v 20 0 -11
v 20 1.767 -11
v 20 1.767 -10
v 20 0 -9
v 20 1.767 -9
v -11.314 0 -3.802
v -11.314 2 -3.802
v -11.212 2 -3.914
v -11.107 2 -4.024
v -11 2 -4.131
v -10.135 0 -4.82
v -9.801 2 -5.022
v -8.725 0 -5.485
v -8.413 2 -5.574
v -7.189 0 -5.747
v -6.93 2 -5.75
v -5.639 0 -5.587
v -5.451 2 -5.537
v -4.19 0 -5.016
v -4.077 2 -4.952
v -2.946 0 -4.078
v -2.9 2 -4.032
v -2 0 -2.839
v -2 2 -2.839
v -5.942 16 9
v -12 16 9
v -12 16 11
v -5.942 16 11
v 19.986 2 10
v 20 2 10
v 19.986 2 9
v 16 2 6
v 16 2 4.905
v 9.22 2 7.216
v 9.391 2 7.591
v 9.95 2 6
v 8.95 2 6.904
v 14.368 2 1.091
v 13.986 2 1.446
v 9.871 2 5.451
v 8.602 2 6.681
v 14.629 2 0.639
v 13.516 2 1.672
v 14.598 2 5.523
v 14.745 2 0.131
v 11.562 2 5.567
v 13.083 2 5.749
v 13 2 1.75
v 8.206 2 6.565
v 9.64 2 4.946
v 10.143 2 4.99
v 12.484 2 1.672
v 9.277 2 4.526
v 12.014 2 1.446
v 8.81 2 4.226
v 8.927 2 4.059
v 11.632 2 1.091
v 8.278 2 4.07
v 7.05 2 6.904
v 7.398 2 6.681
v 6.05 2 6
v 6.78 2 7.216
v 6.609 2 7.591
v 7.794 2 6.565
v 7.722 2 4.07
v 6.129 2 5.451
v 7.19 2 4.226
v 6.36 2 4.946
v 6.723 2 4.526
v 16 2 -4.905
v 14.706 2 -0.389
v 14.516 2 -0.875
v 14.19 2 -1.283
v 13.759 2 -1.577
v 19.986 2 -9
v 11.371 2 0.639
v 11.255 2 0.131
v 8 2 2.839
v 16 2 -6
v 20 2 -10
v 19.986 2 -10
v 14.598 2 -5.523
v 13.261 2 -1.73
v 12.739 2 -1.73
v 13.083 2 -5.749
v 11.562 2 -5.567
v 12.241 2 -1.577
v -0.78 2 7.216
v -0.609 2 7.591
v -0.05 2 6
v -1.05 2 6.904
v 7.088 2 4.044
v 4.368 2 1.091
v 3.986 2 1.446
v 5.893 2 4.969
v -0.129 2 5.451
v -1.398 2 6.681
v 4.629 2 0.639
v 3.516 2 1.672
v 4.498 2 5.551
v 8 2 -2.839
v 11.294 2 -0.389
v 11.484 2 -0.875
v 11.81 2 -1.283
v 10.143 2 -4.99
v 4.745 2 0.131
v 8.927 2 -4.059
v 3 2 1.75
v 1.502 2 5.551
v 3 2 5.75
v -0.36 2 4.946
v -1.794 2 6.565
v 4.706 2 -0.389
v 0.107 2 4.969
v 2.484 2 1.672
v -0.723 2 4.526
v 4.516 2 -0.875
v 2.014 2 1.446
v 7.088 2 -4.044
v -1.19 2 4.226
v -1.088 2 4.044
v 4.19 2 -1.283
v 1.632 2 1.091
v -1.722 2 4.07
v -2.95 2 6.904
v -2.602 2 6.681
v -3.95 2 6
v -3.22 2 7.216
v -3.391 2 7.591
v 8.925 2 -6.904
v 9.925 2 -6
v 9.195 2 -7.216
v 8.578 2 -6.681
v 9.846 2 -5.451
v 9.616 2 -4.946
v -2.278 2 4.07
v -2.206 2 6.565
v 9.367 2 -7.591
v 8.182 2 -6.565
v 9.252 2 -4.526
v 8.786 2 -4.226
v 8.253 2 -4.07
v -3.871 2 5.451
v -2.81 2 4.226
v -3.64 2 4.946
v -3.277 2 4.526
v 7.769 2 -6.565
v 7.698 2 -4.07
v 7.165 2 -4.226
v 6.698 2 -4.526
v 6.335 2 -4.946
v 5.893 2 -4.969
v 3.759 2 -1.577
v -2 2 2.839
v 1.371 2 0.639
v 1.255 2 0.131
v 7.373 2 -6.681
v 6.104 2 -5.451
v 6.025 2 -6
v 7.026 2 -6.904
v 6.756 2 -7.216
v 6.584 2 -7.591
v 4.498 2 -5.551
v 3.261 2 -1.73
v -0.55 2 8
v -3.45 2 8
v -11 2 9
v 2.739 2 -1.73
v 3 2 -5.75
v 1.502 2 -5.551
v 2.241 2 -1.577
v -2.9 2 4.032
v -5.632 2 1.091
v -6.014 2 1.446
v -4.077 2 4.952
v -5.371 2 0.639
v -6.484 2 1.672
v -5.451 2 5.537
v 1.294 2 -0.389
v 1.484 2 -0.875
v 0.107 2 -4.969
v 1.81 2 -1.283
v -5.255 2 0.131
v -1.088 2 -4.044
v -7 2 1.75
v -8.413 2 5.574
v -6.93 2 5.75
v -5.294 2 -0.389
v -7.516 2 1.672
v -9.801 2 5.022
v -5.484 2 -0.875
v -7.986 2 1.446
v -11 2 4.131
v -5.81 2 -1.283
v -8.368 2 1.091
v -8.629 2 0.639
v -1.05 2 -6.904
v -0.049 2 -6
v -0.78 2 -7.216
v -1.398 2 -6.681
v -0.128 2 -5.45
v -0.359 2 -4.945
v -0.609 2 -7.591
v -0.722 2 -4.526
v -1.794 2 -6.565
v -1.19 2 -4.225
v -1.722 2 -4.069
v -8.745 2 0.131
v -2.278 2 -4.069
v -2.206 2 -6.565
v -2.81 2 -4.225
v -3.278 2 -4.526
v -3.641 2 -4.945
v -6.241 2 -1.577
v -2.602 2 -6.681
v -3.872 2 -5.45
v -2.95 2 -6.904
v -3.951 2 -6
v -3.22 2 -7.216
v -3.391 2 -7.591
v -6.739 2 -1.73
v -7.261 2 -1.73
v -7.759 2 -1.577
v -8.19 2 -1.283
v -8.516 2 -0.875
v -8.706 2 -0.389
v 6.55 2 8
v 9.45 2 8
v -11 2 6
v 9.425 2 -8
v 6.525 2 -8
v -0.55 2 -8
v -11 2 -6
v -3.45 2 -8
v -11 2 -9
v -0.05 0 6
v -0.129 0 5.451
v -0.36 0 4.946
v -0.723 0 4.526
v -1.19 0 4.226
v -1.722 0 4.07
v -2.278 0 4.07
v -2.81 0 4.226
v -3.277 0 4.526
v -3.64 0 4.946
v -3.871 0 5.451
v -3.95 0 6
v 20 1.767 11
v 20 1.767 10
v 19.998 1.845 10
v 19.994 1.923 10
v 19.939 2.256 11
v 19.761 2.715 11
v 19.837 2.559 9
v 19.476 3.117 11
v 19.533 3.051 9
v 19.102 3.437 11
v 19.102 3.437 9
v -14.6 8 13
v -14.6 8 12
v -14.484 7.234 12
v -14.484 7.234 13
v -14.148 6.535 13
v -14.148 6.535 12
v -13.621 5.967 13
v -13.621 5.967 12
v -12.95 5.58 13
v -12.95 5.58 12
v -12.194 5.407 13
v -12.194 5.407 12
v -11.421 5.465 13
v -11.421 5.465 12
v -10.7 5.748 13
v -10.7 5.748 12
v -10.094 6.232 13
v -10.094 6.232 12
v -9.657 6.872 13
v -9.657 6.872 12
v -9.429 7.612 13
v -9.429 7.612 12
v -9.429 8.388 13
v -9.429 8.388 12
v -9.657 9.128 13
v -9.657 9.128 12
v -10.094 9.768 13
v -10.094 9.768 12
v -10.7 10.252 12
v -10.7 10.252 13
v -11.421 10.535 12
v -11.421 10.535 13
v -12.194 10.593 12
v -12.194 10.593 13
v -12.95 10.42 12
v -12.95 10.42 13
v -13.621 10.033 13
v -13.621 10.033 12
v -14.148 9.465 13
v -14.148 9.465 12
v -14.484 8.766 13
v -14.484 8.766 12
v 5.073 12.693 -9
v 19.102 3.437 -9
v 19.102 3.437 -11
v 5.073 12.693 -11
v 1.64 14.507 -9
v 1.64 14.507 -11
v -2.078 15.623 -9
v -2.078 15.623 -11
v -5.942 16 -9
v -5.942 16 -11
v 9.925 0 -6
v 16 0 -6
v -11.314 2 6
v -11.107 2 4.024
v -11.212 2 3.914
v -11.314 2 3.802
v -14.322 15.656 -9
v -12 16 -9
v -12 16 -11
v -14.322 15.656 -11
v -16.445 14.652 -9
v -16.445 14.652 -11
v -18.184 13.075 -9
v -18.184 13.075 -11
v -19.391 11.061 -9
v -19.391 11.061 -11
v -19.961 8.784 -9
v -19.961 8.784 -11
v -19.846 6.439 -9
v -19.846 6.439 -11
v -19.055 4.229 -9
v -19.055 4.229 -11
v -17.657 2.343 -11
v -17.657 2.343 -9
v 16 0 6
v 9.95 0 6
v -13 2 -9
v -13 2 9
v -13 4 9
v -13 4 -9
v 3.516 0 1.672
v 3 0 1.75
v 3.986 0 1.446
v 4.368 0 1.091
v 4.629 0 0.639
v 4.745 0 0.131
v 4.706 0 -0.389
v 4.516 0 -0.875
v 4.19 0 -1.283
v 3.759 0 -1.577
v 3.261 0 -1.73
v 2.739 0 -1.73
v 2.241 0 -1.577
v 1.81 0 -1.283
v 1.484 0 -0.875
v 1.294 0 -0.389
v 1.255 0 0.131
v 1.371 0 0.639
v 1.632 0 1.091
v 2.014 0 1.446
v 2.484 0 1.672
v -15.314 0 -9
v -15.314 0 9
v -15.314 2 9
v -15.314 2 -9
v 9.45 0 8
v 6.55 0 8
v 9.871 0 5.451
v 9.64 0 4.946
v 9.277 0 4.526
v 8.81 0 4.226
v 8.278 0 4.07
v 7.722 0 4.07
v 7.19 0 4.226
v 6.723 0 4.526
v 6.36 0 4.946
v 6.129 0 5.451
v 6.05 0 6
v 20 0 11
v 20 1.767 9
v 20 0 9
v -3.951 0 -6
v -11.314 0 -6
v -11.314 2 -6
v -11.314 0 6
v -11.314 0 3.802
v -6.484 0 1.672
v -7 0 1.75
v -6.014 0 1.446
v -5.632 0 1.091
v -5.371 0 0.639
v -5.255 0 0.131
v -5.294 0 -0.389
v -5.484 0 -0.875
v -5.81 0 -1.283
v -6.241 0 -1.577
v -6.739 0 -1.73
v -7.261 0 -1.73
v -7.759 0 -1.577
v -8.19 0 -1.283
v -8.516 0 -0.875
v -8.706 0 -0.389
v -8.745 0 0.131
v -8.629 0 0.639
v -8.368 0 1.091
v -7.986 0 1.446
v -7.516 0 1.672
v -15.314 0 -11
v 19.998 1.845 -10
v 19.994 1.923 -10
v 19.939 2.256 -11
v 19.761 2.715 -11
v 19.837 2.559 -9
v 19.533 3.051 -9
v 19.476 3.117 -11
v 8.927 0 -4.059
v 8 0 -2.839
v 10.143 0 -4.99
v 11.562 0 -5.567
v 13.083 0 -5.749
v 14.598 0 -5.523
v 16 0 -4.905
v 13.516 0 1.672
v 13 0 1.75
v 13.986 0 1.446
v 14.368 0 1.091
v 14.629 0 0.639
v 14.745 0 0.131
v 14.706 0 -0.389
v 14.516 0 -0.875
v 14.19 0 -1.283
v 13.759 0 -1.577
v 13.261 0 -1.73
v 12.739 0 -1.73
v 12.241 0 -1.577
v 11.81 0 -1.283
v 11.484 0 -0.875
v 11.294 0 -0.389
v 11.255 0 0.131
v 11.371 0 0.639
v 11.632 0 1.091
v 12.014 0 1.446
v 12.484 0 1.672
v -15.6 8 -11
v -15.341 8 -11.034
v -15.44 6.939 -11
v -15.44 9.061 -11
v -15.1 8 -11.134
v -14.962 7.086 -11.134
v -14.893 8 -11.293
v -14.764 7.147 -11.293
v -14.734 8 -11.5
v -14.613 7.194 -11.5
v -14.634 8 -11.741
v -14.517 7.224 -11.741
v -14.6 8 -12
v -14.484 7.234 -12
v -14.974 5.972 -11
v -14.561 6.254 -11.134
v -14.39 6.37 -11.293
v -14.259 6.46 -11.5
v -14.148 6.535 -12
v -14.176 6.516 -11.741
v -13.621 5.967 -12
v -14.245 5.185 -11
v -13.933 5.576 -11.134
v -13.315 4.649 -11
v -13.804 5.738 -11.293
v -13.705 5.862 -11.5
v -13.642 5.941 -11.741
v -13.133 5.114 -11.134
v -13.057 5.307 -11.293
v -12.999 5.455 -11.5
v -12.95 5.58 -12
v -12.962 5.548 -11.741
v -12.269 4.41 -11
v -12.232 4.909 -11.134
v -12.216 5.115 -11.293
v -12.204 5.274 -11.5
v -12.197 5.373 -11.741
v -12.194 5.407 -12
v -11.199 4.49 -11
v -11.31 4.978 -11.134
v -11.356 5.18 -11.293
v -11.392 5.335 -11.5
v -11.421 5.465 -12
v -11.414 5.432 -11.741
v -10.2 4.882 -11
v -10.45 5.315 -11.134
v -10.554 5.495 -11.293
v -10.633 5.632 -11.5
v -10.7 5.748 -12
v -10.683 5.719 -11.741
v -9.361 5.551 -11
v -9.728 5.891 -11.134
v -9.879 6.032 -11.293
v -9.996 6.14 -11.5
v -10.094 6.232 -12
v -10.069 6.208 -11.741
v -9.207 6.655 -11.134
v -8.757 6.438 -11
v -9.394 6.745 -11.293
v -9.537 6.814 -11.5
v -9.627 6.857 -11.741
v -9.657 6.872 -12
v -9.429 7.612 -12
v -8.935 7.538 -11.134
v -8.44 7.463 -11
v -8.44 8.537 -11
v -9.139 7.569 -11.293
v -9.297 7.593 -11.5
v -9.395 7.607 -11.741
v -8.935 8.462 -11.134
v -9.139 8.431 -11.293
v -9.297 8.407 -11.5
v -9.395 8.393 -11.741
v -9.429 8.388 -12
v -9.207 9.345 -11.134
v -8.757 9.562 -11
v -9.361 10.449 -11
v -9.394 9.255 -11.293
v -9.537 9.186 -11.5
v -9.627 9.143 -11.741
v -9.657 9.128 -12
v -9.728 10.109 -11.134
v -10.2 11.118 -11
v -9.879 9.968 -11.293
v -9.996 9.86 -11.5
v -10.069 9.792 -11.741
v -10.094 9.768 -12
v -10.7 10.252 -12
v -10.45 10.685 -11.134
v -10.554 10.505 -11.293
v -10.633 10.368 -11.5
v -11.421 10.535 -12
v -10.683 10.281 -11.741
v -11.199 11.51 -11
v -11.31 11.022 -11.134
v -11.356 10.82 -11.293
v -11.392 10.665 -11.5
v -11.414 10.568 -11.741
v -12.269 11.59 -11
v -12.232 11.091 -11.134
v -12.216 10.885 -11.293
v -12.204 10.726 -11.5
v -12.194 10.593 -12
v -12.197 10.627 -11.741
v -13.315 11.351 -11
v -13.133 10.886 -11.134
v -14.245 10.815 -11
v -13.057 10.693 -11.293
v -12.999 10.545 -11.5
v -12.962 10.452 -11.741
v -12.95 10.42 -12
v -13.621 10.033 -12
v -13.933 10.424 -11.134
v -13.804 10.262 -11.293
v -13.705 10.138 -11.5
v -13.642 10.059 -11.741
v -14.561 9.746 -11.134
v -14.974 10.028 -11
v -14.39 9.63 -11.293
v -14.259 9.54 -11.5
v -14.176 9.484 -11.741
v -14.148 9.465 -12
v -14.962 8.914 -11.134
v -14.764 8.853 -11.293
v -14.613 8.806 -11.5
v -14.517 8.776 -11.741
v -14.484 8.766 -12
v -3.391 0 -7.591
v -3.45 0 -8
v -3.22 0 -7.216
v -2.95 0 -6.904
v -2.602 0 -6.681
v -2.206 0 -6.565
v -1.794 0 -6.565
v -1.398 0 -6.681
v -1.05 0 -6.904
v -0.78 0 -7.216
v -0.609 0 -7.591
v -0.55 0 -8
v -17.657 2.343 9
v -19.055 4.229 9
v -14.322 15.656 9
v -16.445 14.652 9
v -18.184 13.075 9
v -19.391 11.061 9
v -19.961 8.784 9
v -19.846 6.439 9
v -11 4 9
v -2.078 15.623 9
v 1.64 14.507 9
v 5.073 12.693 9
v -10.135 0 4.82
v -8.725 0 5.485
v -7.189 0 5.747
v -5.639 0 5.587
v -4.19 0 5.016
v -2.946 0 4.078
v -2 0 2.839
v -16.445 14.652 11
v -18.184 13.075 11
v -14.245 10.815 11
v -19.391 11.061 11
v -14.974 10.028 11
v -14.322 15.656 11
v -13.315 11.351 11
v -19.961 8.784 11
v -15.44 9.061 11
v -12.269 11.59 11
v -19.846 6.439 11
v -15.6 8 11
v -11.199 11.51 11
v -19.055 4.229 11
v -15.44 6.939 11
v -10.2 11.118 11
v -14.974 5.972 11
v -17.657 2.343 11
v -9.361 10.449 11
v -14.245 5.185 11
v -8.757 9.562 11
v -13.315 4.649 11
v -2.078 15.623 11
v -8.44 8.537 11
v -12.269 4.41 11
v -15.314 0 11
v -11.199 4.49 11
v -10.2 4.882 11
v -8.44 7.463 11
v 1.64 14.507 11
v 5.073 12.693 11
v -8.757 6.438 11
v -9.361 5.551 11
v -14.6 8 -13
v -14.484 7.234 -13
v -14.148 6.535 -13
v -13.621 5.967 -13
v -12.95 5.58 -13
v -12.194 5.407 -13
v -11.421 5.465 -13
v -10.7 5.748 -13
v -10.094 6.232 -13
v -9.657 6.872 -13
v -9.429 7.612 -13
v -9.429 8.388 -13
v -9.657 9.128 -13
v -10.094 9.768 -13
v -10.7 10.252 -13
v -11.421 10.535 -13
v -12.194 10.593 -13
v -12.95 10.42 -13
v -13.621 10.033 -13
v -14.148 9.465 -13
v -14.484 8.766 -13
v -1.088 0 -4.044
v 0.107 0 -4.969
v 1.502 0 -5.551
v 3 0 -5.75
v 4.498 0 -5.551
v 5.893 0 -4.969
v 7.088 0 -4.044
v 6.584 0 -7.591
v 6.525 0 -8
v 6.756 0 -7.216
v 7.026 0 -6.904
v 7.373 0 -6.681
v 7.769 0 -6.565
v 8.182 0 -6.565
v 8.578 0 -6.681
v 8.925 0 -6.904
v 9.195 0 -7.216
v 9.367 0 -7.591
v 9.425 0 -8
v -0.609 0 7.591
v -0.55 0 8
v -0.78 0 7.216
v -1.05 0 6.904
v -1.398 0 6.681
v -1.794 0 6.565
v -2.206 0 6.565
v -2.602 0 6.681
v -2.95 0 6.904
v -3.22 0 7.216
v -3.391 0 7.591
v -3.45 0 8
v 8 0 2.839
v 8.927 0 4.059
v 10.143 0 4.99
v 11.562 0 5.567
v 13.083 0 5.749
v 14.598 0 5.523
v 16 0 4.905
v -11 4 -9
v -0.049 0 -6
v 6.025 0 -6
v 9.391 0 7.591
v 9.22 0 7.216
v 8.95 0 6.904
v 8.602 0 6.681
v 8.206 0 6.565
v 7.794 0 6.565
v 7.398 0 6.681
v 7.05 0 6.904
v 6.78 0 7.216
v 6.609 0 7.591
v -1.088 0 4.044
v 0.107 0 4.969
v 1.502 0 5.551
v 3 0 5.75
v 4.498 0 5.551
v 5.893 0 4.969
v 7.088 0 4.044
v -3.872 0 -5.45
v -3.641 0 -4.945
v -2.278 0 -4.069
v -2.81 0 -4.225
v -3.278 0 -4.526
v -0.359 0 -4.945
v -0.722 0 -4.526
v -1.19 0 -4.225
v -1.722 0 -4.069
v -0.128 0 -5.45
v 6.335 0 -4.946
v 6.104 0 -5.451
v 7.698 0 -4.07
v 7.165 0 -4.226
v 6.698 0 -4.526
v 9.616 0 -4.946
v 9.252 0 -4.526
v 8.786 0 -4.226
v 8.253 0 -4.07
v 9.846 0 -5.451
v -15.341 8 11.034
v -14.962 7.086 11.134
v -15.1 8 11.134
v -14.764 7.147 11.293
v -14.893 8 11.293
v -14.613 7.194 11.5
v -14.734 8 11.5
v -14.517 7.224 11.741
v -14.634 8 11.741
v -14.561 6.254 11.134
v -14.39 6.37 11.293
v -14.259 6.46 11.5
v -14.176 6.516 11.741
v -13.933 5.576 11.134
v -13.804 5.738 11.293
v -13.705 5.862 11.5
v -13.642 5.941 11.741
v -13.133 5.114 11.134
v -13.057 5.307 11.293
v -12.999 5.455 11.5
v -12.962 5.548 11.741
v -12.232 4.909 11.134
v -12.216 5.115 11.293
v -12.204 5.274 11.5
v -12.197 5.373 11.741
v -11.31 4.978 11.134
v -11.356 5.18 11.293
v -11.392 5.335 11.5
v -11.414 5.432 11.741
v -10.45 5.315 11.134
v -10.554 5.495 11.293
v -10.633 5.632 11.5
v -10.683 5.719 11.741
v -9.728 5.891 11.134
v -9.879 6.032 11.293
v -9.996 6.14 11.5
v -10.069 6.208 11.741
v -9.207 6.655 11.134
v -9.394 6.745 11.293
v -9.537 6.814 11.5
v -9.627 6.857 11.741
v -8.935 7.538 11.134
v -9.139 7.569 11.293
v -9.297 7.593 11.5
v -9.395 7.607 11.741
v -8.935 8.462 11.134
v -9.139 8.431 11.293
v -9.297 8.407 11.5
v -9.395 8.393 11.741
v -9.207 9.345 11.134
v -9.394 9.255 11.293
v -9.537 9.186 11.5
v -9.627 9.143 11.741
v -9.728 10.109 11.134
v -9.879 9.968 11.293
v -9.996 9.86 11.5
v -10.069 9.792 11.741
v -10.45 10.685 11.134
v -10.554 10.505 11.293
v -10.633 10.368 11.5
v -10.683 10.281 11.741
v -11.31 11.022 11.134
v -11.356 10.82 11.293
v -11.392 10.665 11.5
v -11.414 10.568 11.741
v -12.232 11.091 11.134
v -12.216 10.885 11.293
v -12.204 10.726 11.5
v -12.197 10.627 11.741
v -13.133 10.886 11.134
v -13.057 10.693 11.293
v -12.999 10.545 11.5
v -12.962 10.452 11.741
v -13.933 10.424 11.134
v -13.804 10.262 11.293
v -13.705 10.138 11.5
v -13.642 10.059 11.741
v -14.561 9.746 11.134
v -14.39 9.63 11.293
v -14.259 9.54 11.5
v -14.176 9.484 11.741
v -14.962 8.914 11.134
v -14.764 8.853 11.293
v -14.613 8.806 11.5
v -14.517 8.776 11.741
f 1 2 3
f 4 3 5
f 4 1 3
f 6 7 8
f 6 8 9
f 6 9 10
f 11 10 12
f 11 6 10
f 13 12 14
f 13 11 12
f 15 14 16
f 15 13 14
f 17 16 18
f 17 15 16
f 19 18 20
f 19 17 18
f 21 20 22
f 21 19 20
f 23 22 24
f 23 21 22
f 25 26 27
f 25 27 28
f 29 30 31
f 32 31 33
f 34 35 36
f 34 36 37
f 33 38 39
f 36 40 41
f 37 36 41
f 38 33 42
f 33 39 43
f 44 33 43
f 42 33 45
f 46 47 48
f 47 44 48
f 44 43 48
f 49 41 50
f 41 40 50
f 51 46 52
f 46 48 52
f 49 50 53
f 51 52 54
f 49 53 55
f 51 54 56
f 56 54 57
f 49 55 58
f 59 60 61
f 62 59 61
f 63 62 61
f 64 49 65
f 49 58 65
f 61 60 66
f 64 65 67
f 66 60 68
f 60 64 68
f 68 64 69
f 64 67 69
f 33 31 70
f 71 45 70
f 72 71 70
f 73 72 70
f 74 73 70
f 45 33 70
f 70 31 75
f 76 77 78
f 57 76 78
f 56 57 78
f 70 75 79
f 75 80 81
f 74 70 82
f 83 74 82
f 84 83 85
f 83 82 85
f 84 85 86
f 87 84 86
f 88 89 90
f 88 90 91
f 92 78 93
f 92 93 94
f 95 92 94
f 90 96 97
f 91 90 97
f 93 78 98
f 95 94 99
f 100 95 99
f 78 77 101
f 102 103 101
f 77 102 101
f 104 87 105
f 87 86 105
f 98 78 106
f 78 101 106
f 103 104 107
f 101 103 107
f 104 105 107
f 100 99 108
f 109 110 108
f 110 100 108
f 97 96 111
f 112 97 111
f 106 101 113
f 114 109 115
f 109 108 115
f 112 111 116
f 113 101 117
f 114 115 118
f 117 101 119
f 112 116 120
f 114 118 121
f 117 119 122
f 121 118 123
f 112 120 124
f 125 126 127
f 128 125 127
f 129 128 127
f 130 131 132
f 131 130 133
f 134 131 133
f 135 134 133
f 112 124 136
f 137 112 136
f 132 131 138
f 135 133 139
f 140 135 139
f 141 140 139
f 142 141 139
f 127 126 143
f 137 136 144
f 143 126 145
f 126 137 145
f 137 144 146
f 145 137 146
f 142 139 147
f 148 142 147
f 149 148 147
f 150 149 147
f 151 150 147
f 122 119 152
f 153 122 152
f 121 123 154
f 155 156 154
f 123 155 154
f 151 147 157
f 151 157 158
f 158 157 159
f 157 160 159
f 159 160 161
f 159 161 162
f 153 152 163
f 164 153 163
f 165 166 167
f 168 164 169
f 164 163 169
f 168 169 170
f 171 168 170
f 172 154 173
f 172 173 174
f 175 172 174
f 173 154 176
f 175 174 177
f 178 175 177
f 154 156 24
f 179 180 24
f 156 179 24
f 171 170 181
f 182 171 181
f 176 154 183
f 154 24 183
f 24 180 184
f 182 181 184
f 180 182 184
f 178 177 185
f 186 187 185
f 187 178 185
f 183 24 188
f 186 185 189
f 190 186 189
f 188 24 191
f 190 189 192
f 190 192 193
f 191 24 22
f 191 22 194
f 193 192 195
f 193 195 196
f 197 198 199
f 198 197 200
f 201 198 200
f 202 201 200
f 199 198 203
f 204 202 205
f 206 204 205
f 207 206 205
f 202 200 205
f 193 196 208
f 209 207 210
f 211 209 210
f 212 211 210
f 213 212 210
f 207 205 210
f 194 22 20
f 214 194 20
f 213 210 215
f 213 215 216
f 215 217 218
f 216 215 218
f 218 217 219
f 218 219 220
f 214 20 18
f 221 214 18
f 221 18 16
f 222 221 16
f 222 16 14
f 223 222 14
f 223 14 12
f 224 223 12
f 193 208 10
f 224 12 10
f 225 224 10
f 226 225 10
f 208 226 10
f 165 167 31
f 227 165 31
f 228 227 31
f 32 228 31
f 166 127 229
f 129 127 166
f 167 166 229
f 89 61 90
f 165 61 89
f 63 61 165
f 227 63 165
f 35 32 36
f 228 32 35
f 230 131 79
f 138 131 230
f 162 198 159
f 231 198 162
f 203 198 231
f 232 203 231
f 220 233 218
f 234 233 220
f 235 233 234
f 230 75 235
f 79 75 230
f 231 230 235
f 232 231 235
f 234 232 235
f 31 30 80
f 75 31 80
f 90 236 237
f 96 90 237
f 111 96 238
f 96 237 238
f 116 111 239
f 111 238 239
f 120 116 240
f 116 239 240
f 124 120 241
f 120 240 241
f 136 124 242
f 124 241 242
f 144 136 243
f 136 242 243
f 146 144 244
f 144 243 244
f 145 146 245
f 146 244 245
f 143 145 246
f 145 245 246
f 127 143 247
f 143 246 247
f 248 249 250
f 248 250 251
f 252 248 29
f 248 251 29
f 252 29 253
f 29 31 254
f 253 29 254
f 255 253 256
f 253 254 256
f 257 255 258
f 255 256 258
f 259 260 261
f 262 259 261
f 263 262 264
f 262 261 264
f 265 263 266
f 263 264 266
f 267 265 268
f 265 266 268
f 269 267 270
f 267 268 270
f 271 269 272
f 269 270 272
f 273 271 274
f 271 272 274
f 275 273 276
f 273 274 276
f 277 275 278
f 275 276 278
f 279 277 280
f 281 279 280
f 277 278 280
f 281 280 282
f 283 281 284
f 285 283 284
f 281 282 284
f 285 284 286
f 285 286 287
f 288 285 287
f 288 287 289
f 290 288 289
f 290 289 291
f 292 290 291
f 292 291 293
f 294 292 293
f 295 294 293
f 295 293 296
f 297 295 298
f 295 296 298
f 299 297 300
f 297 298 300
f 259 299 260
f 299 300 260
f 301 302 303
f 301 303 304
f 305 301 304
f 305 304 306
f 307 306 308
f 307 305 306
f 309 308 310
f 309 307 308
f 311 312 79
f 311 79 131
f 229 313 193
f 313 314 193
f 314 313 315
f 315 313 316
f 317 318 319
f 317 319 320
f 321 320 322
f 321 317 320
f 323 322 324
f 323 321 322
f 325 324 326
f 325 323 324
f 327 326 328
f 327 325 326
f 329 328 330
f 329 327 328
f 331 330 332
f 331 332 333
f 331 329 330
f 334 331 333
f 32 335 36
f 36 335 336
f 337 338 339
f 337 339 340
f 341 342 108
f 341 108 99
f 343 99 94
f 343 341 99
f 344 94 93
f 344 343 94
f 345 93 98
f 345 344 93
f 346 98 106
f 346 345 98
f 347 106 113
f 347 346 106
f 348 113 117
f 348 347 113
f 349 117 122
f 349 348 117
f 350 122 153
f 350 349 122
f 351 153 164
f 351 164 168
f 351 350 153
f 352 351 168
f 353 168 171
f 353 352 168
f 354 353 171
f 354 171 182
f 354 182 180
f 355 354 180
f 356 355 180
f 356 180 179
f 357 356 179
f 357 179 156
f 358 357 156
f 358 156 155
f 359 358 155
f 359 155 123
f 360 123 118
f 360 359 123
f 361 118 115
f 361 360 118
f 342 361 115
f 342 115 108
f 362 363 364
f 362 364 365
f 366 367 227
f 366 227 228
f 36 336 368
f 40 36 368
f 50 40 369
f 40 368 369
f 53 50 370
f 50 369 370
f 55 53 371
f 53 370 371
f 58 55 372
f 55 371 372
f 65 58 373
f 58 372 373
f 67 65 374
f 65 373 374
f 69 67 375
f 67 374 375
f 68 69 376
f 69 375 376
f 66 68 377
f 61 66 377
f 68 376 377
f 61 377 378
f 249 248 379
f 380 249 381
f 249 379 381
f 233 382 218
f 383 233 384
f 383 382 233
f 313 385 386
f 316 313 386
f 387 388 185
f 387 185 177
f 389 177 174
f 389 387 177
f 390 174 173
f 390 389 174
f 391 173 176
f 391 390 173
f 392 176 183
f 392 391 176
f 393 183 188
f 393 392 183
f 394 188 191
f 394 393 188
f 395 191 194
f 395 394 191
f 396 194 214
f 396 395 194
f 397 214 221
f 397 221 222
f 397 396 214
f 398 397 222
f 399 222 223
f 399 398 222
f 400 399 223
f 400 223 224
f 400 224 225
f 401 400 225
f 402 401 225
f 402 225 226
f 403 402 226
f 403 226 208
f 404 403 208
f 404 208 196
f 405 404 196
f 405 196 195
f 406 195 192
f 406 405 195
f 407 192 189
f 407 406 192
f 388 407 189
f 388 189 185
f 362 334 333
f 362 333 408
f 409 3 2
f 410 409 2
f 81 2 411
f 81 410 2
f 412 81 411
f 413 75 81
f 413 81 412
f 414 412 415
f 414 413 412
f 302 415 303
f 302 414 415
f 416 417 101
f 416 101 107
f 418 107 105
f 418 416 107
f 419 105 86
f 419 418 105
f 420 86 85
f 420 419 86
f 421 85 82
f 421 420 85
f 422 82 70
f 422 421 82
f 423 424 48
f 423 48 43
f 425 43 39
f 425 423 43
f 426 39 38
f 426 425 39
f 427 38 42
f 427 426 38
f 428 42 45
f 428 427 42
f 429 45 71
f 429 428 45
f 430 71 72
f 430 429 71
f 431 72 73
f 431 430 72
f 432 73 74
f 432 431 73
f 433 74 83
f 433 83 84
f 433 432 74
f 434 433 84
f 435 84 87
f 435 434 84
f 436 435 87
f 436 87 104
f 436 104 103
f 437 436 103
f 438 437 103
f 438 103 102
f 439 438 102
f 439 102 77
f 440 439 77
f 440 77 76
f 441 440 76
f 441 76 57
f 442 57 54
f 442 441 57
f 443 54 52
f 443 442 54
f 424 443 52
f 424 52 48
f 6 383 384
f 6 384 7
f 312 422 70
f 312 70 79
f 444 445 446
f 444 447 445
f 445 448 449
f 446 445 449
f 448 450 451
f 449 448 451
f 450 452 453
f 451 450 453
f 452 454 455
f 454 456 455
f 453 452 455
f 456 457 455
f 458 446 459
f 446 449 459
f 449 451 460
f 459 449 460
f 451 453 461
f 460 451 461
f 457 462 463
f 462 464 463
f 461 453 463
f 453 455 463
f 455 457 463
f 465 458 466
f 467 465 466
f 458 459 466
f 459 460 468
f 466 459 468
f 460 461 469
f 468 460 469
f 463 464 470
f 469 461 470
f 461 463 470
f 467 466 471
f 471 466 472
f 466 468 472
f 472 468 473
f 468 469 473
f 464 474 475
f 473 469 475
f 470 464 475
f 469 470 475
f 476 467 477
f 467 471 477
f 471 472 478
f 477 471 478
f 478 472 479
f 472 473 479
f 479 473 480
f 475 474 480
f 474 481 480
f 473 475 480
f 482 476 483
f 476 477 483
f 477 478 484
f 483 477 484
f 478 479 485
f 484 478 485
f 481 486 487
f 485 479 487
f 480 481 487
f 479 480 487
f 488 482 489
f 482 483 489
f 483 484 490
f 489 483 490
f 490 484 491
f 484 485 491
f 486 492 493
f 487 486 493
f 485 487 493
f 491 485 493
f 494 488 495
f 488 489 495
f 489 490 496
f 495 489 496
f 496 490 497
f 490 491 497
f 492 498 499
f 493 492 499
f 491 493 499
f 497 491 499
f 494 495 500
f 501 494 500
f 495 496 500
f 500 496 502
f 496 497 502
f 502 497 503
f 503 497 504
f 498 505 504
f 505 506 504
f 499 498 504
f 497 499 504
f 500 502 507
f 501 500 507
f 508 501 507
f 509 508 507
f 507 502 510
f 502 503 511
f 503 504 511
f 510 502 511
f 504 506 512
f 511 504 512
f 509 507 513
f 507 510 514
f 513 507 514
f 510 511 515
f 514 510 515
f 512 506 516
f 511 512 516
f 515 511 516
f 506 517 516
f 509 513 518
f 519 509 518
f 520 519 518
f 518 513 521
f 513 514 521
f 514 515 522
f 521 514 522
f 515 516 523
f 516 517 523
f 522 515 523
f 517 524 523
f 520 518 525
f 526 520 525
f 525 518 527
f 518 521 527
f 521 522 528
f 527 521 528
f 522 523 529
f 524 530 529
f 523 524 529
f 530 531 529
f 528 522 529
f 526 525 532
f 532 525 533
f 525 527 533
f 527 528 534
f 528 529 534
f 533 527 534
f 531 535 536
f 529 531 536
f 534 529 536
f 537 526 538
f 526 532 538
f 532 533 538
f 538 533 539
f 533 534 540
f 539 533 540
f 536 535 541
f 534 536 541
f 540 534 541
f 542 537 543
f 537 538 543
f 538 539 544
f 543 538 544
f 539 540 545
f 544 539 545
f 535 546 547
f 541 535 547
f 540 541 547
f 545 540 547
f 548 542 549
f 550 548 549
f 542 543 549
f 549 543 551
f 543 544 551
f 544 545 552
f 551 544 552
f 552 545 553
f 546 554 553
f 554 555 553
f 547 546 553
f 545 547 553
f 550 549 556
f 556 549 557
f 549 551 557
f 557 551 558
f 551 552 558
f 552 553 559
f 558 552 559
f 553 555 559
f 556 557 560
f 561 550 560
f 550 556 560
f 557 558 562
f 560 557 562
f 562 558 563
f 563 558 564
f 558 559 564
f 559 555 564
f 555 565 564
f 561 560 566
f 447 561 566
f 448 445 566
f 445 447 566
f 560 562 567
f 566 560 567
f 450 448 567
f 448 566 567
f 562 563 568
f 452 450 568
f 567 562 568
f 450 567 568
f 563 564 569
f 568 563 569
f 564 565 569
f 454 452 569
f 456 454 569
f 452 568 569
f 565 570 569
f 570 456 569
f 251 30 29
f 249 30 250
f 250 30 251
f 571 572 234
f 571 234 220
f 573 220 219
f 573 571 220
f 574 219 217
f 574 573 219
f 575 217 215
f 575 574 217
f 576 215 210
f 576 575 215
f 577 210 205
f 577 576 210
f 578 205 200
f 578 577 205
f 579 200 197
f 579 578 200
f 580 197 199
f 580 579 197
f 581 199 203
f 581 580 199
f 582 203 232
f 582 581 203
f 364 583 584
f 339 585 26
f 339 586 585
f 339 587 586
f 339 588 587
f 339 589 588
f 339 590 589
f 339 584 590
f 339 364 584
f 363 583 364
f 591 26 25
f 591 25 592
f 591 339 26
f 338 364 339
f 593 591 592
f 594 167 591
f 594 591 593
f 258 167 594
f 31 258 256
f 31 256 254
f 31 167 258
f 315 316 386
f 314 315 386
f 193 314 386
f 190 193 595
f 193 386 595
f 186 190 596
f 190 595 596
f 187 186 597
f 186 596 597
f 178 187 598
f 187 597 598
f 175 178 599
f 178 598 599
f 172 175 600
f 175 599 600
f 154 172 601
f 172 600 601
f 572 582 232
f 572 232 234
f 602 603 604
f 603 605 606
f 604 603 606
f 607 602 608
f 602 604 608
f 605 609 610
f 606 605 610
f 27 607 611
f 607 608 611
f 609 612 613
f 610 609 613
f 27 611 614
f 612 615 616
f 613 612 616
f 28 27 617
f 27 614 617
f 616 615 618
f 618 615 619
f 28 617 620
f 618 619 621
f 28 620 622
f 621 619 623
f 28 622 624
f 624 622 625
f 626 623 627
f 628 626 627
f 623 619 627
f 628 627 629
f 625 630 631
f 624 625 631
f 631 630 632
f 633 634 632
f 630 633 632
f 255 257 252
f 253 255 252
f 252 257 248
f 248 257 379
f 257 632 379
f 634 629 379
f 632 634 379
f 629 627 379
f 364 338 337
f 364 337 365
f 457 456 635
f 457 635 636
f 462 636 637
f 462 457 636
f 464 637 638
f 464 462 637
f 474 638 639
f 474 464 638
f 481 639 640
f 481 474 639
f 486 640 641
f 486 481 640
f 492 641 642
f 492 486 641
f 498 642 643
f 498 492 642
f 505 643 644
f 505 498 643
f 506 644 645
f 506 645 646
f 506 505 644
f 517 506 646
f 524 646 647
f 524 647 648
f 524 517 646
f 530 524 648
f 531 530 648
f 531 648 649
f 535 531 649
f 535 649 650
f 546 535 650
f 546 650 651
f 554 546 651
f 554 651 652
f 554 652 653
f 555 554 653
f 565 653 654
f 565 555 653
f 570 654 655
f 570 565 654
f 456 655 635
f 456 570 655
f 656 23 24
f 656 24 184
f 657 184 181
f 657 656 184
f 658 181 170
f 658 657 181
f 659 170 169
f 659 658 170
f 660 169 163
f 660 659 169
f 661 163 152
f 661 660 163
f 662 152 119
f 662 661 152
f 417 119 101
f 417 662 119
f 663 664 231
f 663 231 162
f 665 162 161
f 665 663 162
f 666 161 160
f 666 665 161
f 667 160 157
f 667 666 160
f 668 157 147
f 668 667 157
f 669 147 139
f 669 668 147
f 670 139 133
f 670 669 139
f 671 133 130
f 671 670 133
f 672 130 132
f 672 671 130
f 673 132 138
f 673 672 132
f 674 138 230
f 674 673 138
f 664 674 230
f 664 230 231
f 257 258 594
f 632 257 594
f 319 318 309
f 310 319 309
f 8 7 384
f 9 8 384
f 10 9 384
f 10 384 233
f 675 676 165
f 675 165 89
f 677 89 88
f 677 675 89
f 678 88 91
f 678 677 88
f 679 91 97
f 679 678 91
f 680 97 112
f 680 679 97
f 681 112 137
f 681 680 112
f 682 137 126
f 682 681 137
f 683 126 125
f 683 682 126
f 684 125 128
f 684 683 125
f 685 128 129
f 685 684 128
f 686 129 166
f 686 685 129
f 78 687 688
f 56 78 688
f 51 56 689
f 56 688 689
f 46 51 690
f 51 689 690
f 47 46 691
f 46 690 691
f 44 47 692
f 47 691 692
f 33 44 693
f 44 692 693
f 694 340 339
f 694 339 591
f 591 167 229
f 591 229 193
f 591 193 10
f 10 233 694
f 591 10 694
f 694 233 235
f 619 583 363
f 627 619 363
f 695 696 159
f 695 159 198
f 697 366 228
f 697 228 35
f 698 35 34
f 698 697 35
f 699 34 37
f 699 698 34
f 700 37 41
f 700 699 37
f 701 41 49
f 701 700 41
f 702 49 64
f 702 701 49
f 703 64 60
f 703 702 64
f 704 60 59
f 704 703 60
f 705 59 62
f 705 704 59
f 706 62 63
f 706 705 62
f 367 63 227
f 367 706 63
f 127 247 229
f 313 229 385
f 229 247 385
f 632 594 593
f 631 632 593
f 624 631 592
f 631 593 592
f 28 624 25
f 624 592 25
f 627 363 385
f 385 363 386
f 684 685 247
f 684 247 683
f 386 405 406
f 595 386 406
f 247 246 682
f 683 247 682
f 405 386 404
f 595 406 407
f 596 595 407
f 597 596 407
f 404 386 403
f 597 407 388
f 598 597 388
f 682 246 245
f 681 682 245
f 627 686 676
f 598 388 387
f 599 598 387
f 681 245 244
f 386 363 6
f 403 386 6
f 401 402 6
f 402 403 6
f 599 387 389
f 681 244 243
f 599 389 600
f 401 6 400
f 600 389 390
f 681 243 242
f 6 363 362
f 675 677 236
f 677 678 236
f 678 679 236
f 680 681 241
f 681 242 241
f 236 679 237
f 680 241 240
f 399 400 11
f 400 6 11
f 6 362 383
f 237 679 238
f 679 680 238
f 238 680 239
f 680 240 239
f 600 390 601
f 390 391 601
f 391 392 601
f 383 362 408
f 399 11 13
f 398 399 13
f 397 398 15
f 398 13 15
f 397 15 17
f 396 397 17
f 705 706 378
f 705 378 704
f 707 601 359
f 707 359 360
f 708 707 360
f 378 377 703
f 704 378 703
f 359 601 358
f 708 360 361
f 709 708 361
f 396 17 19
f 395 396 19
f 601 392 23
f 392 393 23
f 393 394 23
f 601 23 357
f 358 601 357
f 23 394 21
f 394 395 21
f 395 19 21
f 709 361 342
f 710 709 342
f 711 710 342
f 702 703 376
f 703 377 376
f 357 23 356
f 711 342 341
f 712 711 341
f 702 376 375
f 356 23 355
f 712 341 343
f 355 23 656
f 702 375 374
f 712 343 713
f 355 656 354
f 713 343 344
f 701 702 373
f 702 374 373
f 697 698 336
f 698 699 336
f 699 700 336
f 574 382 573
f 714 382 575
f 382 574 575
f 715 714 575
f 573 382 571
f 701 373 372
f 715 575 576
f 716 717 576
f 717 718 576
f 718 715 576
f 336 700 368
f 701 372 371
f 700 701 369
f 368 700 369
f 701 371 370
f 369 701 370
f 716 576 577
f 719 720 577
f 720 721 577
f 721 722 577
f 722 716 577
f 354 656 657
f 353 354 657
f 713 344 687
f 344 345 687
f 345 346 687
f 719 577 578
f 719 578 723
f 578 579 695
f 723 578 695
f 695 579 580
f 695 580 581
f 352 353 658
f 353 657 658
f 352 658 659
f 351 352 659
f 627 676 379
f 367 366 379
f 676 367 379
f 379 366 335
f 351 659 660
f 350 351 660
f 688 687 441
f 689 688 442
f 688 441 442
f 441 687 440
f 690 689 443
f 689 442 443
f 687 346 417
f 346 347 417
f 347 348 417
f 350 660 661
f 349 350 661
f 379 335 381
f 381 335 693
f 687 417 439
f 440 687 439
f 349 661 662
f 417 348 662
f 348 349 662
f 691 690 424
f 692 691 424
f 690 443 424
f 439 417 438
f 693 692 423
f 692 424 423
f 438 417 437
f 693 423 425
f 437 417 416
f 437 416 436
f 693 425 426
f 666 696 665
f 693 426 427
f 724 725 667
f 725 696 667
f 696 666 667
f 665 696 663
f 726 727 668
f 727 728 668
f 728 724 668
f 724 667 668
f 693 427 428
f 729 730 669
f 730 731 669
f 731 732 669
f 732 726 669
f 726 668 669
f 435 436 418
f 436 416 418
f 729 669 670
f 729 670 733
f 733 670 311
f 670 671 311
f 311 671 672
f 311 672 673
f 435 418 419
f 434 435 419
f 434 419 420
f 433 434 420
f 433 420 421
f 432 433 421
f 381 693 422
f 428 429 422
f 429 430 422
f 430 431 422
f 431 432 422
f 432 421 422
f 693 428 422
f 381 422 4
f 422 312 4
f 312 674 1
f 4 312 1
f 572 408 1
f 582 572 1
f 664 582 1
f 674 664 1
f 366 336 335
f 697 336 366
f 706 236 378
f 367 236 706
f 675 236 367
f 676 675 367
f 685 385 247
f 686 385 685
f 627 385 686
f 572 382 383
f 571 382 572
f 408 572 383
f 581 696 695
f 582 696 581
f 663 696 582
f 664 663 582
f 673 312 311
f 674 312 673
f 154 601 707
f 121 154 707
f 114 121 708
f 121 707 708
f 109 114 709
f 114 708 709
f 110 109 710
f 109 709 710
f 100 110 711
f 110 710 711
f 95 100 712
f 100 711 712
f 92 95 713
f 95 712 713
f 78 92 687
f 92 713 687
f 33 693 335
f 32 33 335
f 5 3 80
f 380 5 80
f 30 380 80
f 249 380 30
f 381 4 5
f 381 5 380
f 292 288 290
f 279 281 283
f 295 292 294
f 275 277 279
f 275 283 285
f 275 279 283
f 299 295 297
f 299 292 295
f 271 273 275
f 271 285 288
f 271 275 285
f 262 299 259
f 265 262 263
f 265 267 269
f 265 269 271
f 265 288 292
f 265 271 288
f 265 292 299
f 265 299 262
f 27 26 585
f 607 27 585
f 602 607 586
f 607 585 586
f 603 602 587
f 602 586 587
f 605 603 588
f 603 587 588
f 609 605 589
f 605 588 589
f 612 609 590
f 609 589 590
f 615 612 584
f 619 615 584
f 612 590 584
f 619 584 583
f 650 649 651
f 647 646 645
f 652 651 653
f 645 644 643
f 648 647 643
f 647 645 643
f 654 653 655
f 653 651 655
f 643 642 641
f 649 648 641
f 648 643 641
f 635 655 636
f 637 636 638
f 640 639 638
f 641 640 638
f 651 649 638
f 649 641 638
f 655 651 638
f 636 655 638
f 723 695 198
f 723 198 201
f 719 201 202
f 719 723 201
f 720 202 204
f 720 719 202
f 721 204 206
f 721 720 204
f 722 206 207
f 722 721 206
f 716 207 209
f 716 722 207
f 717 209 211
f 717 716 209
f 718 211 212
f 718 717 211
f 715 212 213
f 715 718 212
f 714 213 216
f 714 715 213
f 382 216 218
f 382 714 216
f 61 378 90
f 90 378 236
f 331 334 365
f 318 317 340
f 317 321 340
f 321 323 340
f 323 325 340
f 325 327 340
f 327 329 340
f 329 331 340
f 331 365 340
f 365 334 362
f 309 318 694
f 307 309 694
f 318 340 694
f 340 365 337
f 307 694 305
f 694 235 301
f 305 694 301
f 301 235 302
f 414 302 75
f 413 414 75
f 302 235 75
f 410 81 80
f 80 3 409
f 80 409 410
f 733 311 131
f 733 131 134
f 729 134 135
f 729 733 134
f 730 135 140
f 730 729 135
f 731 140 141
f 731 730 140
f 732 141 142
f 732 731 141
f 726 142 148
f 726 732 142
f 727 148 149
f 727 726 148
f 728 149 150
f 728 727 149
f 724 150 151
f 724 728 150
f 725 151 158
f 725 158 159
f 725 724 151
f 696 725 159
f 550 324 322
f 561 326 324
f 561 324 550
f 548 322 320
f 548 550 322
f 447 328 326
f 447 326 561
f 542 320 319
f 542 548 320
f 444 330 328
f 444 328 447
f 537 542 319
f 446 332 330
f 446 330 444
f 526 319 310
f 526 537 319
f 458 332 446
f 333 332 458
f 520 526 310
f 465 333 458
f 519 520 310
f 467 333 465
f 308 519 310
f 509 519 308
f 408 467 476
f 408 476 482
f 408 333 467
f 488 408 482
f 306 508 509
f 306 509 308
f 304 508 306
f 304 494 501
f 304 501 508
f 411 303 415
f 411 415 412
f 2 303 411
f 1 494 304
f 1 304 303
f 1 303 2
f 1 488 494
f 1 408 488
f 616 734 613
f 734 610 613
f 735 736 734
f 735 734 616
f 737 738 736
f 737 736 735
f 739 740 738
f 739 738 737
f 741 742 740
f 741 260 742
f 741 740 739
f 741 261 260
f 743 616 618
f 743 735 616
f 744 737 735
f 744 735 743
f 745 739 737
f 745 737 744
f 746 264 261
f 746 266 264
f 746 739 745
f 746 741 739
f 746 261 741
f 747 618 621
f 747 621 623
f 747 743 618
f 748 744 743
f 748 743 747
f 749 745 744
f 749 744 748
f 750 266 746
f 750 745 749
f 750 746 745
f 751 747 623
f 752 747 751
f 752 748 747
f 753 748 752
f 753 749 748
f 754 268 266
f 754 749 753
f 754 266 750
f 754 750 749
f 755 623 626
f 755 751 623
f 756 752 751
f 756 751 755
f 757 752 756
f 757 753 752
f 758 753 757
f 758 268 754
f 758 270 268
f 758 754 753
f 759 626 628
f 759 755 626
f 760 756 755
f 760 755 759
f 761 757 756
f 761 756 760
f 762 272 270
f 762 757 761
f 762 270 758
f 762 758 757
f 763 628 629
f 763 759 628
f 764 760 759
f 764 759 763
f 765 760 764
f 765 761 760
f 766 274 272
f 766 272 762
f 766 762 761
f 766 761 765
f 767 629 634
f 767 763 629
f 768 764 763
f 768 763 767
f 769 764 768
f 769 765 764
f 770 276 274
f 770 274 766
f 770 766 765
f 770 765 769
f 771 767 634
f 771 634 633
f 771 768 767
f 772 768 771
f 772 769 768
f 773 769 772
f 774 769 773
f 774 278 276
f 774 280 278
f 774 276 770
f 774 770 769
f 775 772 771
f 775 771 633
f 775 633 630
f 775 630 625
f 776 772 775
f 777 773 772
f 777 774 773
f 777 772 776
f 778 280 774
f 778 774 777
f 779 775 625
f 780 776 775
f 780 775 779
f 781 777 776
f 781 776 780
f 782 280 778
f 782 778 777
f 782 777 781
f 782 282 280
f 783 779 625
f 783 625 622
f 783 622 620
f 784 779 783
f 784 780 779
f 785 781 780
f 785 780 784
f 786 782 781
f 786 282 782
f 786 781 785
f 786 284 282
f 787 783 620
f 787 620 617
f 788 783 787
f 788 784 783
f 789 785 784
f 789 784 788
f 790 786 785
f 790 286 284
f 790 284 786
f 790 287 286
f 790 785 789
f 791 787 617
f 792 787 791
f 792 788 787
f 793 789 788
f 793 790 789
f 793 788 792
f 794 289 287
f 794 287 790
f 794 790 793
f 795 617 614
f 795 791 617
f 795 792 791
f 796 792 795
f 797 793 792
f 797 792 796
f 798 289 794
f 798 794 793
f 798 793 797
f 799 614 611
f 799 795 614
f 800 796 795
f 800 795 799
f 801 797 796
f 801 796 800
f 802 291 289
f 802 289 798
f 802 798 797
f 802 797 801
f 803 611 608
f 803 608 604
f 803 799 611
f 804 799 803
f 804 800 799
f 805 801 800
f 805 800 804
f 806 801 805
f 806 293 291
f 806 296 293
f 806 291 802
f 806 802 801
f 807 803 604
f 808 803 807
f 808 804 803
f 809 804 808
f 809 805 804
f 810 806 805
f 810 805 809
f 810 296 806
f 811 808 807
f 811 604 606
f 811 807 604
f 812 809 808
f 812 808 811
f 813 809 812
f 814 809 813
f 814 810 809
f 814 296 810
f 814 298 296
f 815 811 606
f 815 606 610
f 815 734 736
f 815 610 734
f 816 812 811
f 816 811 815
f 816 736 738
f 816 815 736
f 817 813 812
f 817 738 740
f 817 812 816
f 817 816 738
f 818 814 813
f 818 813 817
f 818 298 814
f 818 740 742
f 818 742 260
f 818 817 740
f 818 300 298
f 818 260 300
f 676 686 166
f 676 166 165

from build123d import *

# Parameters (mm, degrees)
SKETCH6_W               = 40
SKETCH6_H               = 2
BOSS_EXTRUDE4_DEPTH     = 16
SKETCH8_R               = 2.6
BOSS_EXTRUDE5_DEPTH     = 2
FILLET1_R               = 1
CUT_EXTRUDE1_DEPTH      = 26.690465157
CUT_EXTRUDE1_DEPTH_BACK = 16
SKETCH7_W               = 42.708590122
SKETCH7_H               = 18.182038554
SKETCH14_R              = 1.749999912
SKETCH14_R_2            = 1.749999996
SKETCH14_R_3            = 1.749999993
BOSS_EXTRUDE8_DEPTH     = 2
SKETCH15_W              = 2
SKETCH15_H              = 18
EXTRUDE_THIN1_DEPTH     = 2


with BuildPart() as part:
    # Sketch6 → Boss-Extrude4 (new body)
    with BuildSketch(Plane(origin=(0, 0, 0), x_dir=(1, 0, 0), z_dir=(0, 1, 0))):
        with Locations((0, -10)):
            Rectangle(SKETCH6_W, SKETCH6_H)
    extrude(amount=BOSS_EXTRUDE4_DEPTH)

    # Sketch8 → Boss-Extrude5 (add)
    with BuildSketch(Plane.XY.offset(11)):
        with Locations(Location((-12, 8, 0), (0, 0, 180))):
            Circle(SKETCH8_R)
    extrude(amount=BOSS_EXTRUDE5_DEPTH)

    # Fillet1
    fillet1_edges = [part.edges().sort_by_distance(p)[0] for p in [
        (-9.4, 8, 11),
    ]]
    fillet(fillet1_edges, radius=FILLET1_R)

    # Sketch7 → Cut-Extrude1 (cut, two sides: drawn at the far end of the back side and taken through both)
    with BuildSketch(Plane.XY.offset(11).offset(-CUT_EXTRUDE1_DEPTH_BACK)):
        with Locations((0, 8)):
            Rectangle(SKETCH7_W, SKETCH7_H)
        with BuildLine():
            Line((-5.942038411, 16), (-12, 16))
            ThreePointArc((-12, 16), (-19.39103626, 11.061467459), (-17.656854249, 2.343145751))
            Line((-17.656854249, 2.343145751), (-15.313708499, 0))
            Line((-15.313708499, 0), (20, 0))
            Line((20, 0), (20, 1.767244224))
            ThreePointArc((20, 1.767244224), (19.761112544, 2.715127447), (19.101517394, 3.43657326))
            Line((19.101517394, 3.43657326), (5.07313553, 12.69329036))
            ThreePointArc((5.07313553, 12.69329036), (-0.191638738, 15.155492779), (-5.942038411, 16))
        make_face(mode=Mode.SUBTRACT)
    extrude(amount=CUT_EXTRUDE1_DEPTH + CUT_EXTRUDE1_DEPTH_BACK, mode=Mode.SUBTRACT)


with BuildPart() as body_2:
    # Mirror2: mirrored copy
    add(part.part.mirror(Plane.XY))


with BuildPart() as part_1:
    add(part.part)

    add(body_2.part)  # Boss-Extrude8 merges body 2
    # Sketch14 → Boss-Extrude8 (add)
    with BuildSketch(Plane(origin=(0, 0, 0), x_dir=(1, 0, 0), z_dir=(0, 1, 0))):
        Polygon((-15.313708496, -10), (-15.313708496, 10), (20.000000038, 10), (19.999999862, -10), align=None)
        with Locations(Location((12.999999996, -3e-07, 0), (0, 0, 270))):
            Circle(SKETCH14_R, mode=Mode.SUBTRACT)
        with Locations(Location((3, -1.24e-07, 0), (0, 0, 270))):
            Circle(SKETCH14_R_2, mode=Mode.SUBTRACT)
        with Locations(Location((-6.999999997, -1.24e-07, 0), (0, 0, 270))):
            Circle(SKETCH14_R_3, mode=Mode.SUBTRACT)
        with BuildLine():
            Line((16.000000003, 6), (9.925463662, 6))
            ThreePointArc((9.925463662, 6), (7.975463662, 4.05), (6.025463662, 6))
            Line((6.025463662, 6), (-0.049072678, 6))
            ThreePointArc((-0.049072678, 6), (-1.999999996, 4.049072682), (-3.950927314, 6))
            Line((-3.950927314, 6), (-11.313708496, 6))
            Line((-11.313708496, 6), (-11.313708496, 3.801896638))
            ThreePointArc((-11.313708496, 3.801896638), (-6.408964515, 5.719543307), (-1.999999996, 2.839454047))
            ThreePointArc((-1.999999996, 2.839454047), (3.000000101, 5.749999872), (8.000000096, 2.83945387))
            ThreePointArc((8.000000096, 2.83945387), (11.562298515, 5.567361143), (15.999999994, 4.905353815))
            Line((15.999999994, 4.905353815), (16.000000003, 6))
        make_face(mode=Mode.SUBTRACT)
        with BuildLine():
            Line((-11.313708496, -6), (-11.313708496, -3.801896885))
            ThreePointArc((-11.313708496, -3.801896885), (-6.408964515, -5.719543555), (-1.999999996, -2.839454295))
            ThreePointArc((-1.999999996, -2.839454295), (3, -5.75000012), (7.999999996, -2.839454295))
            ThreePointArc((7.999999996, -2.839454295), (11.562298368, -5.567361705), (15.999999907, -4.905354469))
            Line((15.999999907, -4.905354469), (15.999999897, -6))
            Line((15.999999897, -6), (9.949999996, -6))
            ThreePointArc((9.949999996, -6), (7.999999996, -4.05), (6.049999996, -6))
            Line((6.049999996, -6), (-0.049999996, -6))
            ThreePointArc((-0.049999996, -6), (-1.999999996, -4.05), (-3.949999996, -6))
            Line((-3.949999996, -6), (-11.313708496, -6))
        make_face(mode=Mode.SUBTRACT)
        with BuildLine():
            Line((9.425463662, 8), (6.525463662, 8))
            ThreePointArc((6.525463662, 8), (7.975463662, 6.55), (9.425463662, 8))
        make_face(mode=Mode.SUBTRACT)
        with BuildLine():
            Line((-3.449999996, -8), (-0.549999996, -8))
            ThreePointArc((-0.549999996, -8), (-1.999999996, -6.55), (-3.449999996, -8))
        make_face(mode=Mode.SUBTRACT)
        with BuildLine():
            Line((-0.549999996, 8), (-3.449999996, 8))
            ThreePointArc((-3.449999996, 8), (-1.999999996, 6.55), (-0.549999996, 8))
        make_face(mode=Mode.SUBTRACT)
        with BuildLine():
            Line((6.549999996, -8), (9.449999996, -8))
            ThreePointArc((9.449999996, -8), (7.999999996, -6.55), (6.549999996, -8))
        make_face(mode=Mode.SUBTRACT)
    extrude(amount=BOSS_EXTRUDE8_DEPTH)

    # Sketch15 → Extrude-Thin1 (add)
    with BuildSketch(Plane(origin=(0, 2, 0), x_dir=(1, 0, 0), z_dir=(0, 1, 0))):
        with Locations((-12, 0)):
            Rectangle(SKETCH15_W, SKETCH15_H)
    extrude(amount=EXTRUDE_THIN1_DEPTH)


solid = part_1.part
